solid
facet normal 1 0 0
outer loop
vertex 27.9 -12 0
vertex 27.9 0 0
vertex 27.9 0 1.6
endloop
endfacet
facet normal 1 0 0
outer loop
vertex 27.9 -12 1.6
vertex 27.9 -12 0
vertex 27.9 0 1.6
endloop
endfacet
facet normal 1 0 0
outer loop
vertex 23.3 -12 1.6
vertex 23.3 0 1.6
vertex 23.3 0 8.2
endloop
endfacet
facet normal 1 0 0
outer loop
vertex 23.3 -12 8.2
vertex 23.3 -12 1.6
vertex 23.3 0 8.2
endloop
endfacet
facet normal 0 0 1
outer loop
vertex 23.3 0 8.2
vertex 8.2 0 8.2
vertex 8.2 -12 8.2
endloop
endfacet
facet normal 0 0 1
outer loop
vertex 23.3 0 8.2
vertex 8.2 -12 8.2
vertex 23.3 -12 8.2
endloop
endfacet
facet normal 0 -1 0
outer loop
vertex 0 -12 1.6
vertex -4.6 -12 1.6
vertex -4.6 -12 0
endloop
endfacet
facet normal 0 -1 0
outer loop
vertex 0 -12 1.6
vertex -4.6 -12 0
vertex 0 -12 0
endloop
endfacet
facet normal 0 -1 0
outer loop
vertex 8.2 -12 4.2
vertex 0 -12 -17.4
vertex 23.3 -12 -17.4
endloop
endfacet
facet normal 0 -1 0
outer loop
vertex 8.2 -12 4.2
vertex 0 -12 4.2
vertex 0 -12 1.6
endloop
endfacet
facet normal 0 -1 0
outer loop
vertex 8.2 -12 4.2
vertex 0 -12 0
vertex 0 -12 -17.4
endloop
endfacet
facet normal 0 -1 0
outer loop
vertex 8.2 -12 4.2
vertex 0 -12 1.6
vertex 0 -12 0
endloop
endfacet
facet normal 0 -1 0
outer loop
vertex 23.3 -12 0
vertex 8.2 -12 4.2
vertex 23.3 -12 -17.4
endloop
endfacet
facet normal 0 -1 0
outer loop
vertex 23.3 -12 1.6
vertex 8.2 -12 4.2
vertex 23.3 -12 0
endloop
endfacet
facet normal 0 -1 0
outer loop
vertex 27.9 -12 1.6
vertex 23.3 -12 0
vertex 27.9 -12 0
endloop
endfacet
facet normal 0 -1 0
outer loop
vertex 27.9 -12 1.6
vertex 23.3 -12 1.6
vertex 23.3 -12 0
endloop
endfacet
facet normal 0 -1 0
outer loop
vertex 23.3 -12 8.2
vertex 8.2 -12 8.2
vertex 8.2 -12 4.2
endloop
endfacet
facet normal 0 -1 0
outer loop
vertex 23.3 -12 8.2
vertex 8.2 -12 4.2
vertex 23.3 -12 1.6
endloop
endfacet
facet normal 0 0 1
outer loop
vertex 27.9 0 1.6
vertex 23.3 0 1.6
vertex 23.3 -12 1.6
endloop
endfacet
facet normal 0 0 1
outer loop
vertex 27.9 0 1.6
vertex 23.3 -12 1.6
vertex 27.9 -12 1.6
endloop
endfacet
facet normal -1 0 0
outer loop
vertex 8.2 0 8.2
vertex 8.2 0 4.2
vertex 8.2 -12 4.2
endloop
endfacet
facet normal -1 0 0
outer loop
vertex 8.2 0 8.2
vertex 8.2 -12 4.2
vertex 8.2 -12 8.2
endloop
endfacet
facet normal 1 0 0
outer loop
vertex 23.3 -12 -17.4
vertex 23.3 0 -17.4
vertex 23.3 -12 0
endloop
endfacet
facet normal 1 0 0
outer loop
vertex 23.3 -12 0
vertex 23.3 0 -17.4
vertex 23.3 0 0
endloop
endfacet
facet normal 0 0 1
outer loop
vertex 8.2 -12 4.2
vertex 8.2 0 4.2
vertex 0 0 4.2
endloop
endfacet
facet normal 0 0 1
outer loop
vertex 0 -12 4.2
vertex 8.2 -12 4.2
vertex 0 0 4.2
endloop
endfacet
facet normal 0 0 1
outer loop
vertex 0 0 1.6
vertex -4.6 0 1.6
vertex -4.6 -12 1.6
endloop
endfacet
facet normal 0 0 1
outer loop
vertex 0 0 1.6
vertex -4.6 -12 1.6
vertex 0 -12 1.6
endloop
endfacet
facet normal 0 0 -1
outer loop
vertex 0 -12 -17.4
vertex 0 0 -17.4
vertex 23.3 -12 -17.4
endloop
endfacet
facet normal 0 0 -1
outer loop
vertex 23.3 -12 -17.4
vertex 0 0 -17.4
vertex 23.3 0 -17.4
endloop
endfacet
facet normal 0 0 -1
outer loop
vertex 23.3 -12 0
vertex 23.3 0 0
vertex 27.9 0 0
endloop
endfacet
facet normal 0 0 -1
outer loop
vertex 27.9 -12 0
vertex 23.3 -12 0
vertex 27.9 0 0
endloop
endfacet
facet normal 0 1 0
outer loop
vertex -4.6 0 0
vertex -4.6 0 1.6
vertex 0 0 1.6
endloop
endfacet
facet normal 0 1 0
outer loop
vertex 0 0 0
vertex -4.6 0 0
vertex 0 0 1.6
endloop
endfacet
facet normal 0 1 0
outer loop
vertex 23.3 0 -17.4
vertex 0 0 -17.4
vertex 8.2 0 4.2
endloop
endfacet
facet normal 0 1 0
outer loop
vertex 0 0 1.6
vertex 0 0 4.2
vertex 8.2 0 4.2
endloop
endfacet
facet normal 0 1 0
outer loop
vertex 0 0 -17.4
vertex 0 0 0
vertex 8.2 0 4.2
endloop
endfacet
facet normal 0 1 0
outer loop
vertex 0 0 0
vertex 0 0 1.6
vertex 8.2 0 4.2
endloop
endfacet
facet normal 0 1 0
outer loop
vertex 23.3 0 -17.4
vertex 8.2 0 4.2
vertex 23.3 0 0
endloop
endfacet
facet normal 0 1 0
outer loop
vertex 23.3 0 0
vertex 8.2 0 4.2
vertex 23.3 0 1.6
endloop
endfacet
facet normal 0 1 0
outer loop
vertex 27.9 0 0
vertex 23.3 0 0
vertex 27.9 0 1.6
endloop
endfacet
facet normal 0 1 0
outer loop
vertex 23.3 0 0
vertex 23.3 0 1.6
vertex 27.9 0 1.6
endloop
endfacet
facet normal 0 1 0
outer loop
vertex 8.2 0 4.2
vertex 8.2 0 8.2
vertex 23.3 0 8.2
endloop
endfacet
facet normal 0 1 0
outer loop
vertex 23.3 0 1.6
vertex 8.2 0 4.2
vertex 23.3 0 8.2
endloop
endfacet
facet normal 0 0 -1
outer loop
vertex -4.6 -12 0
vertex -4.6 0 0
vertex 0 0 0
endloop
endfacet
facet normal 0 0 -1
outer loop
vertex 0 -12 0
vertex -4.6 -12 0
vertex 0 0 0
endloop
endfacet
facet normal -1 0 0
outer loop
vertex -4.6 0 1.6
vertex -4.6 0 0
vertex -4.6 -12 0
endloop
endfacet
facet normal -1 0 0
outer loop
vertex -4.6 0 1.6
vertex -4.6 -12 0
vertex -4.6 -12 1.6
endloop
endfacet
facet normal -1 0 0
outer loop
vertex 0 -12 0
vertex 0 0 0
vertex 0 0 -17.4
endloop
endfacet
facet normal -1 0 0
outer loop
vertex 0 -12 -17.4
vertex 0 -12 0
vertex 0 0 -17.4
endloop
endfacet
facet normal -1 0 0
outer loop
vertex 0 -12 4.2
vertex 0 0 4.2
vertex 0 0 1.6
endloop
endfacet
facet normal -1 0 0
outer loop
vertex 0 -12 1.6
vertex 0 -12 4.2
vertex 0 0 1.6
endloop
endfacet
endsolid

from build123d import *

# Parameters (mm, degrees)
F0_W     = 23.3
F0_H     = 17.4
F0_W_2   = 15.1
F0_H_2   = 4
F0_H_3   = 1.6
F0_W_3   = 4.6
F1_DEPTH = 12


with BuildPart() as f1:
    # F0 (on Front) → F1 (new body)
    with BuildSketch(Plane.XZ):
        with Locations((11.65, -8.7)):
            Rectangle(F0_W, F0_H)
        with Locations((15.75, 6.2)):
            Rectangle(F0_W_2, F0_H_2)
        Polygon((8.2, 4.2), (0, 4.2), (0, 1.6), (23.3, 1.6), (23.3, 4.2), align=None)
        with Locations((11.65, 0.8)):
            Rectangle(F0_W, F0_H_3)
        with Locations((25.6, 0.8)):
            Rectangle(F0_W_3, F0_H_3)
        with Locations((-2.3, 0.8)):
            Rectangle(F0_W_3, F0_H_3)
    extrude(amount=F1_DEPTH)


solid = f1.part
